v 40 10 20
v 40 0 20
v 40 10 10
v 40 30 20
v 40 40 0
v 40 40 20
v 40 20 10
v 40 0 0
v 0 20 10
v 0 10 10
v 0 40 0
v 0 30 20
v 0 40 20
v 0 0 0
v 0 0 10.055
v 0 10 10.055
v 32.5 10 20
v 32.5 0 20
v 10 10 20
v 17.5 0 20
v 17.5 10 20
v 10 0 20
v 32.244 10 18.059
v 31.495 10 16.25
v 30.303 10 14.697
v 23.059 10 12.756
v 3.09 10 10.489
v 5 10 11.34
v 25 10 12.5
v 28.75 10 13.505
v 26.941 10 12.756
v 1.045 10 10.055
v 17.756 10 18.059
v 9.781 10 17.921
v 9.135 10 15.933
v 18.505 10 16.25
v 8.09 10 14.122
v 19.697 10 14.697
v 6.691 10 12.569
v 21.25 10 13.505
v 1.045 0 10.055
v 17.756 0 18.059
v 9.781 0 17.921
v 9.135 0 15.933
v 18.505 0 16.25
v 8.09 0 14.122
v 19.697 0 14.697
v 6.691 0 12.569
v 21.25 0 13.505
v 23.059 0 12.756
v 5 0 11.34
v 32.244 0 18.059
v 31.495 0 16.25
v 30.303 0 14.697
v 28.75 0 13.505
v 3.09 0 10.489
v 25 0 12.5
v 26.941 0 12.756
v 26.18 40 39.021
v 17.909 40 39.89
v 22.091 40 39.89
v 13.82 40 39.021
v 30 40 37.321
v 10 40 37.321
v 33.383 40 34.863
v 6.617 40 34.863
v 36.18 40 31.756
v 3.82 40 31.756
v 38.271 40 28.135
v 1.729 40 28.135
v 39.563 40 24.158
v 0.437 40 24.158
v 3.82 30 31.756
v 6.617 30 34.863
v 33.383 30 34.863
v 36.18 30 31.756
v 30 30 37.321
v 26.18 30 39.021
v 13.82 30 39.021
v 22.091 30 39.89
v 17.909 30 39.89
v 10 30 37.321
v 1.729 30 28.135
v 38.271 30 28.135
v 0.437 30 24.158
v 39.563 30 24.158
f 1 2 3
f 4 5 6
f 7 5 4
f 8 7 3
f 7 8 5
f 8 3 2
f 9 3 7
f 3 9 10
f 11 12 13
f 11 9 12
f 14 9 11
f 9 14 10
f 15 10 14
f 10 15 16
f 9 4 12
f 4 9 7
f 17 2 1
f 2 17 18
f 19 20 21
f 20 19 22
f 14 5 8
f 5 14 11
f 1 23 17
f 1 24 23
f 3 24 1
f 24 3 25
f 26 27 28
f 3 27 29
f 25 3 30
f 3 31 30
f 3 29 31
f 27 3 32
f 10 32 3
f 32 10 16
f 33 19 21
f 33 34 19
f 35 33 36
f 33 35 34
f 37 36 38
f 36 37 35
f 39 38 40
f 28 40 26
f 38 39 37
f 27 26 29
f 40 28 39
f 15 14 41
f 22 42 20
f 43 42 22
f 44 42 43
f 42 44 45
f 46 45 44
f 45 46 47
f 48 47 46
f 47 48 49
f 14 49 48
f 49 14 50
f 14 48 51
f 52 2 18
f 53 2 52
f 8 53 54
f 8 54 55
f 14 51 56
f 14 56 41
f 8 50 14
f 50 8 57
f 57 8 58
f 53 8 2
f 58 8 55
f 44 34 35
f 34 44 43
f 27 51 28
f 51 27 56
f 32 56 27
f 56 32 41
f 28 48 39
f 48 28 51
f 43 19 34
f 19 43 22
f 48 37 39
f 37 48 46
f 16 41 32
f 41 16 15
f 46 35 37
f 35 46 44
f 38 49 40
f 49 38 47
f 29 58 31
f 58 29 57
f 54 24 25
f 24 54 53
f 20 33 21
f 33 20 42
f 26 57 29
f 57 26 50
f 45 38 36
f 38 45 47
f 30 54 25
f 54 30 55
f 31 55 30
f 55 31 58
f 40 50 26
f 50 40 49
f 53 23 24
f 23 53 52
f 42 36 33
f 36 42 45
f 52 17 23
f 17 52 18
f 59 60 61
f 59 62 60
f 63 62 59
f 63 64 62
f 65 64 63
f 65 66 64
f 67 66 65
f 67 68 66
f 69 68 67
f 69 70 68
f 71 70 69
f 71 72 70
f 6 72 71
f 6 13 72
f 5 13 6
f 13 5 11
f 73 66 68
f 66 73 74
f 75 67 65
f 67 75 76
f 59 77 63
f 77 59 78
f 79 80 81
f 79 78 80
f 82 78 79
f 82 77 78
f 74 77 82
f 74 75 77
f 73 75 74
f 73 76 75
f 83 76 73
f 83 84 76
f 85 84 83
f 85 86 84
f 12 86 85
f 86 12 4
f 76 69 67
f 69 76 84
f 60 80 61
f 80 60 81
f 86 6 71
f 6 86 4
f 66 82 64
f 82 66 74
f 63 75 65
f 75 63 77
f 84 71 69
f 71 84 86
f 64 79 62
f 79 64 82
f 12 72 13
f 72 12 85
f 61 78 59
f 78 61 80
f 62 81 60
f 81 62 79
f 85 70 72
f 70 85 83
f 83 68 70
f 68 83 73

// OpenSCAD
 

  
  // base
    cube([40, 40, 10]);
    
    // pared trasera
      translate([0, 30, 0])
    cube([40, 10, 20]);  
    
          // plano inclinado
       
       translate([0, 20, 10])
   difference(){ 
      cube([40, 10, 10]);
       rotate([ 45,0, 0])
     cube([40, 20,10]);
   }
        // parte cilindrica   
          translate([20, 40, 20]) 
         rotate([90, 0, 0])   
 cylinder(r1=20, r2=20, h=10, center=false);
       
     // pared frontal
        difference(){
    difference(){
      cube([40, 10, 20]);
              translate([0, 15, 20])
          rotate([90, 0, 0])
    cylinder(r1=10, r2=10, h=20, center=false);
    }
    // agujero cilindrico pared
              translate([25, 15, 20])
          rotate([90, 0, 0])
    cylinder(r1=7.5, r2=7.5, h=20, center=false);
}
